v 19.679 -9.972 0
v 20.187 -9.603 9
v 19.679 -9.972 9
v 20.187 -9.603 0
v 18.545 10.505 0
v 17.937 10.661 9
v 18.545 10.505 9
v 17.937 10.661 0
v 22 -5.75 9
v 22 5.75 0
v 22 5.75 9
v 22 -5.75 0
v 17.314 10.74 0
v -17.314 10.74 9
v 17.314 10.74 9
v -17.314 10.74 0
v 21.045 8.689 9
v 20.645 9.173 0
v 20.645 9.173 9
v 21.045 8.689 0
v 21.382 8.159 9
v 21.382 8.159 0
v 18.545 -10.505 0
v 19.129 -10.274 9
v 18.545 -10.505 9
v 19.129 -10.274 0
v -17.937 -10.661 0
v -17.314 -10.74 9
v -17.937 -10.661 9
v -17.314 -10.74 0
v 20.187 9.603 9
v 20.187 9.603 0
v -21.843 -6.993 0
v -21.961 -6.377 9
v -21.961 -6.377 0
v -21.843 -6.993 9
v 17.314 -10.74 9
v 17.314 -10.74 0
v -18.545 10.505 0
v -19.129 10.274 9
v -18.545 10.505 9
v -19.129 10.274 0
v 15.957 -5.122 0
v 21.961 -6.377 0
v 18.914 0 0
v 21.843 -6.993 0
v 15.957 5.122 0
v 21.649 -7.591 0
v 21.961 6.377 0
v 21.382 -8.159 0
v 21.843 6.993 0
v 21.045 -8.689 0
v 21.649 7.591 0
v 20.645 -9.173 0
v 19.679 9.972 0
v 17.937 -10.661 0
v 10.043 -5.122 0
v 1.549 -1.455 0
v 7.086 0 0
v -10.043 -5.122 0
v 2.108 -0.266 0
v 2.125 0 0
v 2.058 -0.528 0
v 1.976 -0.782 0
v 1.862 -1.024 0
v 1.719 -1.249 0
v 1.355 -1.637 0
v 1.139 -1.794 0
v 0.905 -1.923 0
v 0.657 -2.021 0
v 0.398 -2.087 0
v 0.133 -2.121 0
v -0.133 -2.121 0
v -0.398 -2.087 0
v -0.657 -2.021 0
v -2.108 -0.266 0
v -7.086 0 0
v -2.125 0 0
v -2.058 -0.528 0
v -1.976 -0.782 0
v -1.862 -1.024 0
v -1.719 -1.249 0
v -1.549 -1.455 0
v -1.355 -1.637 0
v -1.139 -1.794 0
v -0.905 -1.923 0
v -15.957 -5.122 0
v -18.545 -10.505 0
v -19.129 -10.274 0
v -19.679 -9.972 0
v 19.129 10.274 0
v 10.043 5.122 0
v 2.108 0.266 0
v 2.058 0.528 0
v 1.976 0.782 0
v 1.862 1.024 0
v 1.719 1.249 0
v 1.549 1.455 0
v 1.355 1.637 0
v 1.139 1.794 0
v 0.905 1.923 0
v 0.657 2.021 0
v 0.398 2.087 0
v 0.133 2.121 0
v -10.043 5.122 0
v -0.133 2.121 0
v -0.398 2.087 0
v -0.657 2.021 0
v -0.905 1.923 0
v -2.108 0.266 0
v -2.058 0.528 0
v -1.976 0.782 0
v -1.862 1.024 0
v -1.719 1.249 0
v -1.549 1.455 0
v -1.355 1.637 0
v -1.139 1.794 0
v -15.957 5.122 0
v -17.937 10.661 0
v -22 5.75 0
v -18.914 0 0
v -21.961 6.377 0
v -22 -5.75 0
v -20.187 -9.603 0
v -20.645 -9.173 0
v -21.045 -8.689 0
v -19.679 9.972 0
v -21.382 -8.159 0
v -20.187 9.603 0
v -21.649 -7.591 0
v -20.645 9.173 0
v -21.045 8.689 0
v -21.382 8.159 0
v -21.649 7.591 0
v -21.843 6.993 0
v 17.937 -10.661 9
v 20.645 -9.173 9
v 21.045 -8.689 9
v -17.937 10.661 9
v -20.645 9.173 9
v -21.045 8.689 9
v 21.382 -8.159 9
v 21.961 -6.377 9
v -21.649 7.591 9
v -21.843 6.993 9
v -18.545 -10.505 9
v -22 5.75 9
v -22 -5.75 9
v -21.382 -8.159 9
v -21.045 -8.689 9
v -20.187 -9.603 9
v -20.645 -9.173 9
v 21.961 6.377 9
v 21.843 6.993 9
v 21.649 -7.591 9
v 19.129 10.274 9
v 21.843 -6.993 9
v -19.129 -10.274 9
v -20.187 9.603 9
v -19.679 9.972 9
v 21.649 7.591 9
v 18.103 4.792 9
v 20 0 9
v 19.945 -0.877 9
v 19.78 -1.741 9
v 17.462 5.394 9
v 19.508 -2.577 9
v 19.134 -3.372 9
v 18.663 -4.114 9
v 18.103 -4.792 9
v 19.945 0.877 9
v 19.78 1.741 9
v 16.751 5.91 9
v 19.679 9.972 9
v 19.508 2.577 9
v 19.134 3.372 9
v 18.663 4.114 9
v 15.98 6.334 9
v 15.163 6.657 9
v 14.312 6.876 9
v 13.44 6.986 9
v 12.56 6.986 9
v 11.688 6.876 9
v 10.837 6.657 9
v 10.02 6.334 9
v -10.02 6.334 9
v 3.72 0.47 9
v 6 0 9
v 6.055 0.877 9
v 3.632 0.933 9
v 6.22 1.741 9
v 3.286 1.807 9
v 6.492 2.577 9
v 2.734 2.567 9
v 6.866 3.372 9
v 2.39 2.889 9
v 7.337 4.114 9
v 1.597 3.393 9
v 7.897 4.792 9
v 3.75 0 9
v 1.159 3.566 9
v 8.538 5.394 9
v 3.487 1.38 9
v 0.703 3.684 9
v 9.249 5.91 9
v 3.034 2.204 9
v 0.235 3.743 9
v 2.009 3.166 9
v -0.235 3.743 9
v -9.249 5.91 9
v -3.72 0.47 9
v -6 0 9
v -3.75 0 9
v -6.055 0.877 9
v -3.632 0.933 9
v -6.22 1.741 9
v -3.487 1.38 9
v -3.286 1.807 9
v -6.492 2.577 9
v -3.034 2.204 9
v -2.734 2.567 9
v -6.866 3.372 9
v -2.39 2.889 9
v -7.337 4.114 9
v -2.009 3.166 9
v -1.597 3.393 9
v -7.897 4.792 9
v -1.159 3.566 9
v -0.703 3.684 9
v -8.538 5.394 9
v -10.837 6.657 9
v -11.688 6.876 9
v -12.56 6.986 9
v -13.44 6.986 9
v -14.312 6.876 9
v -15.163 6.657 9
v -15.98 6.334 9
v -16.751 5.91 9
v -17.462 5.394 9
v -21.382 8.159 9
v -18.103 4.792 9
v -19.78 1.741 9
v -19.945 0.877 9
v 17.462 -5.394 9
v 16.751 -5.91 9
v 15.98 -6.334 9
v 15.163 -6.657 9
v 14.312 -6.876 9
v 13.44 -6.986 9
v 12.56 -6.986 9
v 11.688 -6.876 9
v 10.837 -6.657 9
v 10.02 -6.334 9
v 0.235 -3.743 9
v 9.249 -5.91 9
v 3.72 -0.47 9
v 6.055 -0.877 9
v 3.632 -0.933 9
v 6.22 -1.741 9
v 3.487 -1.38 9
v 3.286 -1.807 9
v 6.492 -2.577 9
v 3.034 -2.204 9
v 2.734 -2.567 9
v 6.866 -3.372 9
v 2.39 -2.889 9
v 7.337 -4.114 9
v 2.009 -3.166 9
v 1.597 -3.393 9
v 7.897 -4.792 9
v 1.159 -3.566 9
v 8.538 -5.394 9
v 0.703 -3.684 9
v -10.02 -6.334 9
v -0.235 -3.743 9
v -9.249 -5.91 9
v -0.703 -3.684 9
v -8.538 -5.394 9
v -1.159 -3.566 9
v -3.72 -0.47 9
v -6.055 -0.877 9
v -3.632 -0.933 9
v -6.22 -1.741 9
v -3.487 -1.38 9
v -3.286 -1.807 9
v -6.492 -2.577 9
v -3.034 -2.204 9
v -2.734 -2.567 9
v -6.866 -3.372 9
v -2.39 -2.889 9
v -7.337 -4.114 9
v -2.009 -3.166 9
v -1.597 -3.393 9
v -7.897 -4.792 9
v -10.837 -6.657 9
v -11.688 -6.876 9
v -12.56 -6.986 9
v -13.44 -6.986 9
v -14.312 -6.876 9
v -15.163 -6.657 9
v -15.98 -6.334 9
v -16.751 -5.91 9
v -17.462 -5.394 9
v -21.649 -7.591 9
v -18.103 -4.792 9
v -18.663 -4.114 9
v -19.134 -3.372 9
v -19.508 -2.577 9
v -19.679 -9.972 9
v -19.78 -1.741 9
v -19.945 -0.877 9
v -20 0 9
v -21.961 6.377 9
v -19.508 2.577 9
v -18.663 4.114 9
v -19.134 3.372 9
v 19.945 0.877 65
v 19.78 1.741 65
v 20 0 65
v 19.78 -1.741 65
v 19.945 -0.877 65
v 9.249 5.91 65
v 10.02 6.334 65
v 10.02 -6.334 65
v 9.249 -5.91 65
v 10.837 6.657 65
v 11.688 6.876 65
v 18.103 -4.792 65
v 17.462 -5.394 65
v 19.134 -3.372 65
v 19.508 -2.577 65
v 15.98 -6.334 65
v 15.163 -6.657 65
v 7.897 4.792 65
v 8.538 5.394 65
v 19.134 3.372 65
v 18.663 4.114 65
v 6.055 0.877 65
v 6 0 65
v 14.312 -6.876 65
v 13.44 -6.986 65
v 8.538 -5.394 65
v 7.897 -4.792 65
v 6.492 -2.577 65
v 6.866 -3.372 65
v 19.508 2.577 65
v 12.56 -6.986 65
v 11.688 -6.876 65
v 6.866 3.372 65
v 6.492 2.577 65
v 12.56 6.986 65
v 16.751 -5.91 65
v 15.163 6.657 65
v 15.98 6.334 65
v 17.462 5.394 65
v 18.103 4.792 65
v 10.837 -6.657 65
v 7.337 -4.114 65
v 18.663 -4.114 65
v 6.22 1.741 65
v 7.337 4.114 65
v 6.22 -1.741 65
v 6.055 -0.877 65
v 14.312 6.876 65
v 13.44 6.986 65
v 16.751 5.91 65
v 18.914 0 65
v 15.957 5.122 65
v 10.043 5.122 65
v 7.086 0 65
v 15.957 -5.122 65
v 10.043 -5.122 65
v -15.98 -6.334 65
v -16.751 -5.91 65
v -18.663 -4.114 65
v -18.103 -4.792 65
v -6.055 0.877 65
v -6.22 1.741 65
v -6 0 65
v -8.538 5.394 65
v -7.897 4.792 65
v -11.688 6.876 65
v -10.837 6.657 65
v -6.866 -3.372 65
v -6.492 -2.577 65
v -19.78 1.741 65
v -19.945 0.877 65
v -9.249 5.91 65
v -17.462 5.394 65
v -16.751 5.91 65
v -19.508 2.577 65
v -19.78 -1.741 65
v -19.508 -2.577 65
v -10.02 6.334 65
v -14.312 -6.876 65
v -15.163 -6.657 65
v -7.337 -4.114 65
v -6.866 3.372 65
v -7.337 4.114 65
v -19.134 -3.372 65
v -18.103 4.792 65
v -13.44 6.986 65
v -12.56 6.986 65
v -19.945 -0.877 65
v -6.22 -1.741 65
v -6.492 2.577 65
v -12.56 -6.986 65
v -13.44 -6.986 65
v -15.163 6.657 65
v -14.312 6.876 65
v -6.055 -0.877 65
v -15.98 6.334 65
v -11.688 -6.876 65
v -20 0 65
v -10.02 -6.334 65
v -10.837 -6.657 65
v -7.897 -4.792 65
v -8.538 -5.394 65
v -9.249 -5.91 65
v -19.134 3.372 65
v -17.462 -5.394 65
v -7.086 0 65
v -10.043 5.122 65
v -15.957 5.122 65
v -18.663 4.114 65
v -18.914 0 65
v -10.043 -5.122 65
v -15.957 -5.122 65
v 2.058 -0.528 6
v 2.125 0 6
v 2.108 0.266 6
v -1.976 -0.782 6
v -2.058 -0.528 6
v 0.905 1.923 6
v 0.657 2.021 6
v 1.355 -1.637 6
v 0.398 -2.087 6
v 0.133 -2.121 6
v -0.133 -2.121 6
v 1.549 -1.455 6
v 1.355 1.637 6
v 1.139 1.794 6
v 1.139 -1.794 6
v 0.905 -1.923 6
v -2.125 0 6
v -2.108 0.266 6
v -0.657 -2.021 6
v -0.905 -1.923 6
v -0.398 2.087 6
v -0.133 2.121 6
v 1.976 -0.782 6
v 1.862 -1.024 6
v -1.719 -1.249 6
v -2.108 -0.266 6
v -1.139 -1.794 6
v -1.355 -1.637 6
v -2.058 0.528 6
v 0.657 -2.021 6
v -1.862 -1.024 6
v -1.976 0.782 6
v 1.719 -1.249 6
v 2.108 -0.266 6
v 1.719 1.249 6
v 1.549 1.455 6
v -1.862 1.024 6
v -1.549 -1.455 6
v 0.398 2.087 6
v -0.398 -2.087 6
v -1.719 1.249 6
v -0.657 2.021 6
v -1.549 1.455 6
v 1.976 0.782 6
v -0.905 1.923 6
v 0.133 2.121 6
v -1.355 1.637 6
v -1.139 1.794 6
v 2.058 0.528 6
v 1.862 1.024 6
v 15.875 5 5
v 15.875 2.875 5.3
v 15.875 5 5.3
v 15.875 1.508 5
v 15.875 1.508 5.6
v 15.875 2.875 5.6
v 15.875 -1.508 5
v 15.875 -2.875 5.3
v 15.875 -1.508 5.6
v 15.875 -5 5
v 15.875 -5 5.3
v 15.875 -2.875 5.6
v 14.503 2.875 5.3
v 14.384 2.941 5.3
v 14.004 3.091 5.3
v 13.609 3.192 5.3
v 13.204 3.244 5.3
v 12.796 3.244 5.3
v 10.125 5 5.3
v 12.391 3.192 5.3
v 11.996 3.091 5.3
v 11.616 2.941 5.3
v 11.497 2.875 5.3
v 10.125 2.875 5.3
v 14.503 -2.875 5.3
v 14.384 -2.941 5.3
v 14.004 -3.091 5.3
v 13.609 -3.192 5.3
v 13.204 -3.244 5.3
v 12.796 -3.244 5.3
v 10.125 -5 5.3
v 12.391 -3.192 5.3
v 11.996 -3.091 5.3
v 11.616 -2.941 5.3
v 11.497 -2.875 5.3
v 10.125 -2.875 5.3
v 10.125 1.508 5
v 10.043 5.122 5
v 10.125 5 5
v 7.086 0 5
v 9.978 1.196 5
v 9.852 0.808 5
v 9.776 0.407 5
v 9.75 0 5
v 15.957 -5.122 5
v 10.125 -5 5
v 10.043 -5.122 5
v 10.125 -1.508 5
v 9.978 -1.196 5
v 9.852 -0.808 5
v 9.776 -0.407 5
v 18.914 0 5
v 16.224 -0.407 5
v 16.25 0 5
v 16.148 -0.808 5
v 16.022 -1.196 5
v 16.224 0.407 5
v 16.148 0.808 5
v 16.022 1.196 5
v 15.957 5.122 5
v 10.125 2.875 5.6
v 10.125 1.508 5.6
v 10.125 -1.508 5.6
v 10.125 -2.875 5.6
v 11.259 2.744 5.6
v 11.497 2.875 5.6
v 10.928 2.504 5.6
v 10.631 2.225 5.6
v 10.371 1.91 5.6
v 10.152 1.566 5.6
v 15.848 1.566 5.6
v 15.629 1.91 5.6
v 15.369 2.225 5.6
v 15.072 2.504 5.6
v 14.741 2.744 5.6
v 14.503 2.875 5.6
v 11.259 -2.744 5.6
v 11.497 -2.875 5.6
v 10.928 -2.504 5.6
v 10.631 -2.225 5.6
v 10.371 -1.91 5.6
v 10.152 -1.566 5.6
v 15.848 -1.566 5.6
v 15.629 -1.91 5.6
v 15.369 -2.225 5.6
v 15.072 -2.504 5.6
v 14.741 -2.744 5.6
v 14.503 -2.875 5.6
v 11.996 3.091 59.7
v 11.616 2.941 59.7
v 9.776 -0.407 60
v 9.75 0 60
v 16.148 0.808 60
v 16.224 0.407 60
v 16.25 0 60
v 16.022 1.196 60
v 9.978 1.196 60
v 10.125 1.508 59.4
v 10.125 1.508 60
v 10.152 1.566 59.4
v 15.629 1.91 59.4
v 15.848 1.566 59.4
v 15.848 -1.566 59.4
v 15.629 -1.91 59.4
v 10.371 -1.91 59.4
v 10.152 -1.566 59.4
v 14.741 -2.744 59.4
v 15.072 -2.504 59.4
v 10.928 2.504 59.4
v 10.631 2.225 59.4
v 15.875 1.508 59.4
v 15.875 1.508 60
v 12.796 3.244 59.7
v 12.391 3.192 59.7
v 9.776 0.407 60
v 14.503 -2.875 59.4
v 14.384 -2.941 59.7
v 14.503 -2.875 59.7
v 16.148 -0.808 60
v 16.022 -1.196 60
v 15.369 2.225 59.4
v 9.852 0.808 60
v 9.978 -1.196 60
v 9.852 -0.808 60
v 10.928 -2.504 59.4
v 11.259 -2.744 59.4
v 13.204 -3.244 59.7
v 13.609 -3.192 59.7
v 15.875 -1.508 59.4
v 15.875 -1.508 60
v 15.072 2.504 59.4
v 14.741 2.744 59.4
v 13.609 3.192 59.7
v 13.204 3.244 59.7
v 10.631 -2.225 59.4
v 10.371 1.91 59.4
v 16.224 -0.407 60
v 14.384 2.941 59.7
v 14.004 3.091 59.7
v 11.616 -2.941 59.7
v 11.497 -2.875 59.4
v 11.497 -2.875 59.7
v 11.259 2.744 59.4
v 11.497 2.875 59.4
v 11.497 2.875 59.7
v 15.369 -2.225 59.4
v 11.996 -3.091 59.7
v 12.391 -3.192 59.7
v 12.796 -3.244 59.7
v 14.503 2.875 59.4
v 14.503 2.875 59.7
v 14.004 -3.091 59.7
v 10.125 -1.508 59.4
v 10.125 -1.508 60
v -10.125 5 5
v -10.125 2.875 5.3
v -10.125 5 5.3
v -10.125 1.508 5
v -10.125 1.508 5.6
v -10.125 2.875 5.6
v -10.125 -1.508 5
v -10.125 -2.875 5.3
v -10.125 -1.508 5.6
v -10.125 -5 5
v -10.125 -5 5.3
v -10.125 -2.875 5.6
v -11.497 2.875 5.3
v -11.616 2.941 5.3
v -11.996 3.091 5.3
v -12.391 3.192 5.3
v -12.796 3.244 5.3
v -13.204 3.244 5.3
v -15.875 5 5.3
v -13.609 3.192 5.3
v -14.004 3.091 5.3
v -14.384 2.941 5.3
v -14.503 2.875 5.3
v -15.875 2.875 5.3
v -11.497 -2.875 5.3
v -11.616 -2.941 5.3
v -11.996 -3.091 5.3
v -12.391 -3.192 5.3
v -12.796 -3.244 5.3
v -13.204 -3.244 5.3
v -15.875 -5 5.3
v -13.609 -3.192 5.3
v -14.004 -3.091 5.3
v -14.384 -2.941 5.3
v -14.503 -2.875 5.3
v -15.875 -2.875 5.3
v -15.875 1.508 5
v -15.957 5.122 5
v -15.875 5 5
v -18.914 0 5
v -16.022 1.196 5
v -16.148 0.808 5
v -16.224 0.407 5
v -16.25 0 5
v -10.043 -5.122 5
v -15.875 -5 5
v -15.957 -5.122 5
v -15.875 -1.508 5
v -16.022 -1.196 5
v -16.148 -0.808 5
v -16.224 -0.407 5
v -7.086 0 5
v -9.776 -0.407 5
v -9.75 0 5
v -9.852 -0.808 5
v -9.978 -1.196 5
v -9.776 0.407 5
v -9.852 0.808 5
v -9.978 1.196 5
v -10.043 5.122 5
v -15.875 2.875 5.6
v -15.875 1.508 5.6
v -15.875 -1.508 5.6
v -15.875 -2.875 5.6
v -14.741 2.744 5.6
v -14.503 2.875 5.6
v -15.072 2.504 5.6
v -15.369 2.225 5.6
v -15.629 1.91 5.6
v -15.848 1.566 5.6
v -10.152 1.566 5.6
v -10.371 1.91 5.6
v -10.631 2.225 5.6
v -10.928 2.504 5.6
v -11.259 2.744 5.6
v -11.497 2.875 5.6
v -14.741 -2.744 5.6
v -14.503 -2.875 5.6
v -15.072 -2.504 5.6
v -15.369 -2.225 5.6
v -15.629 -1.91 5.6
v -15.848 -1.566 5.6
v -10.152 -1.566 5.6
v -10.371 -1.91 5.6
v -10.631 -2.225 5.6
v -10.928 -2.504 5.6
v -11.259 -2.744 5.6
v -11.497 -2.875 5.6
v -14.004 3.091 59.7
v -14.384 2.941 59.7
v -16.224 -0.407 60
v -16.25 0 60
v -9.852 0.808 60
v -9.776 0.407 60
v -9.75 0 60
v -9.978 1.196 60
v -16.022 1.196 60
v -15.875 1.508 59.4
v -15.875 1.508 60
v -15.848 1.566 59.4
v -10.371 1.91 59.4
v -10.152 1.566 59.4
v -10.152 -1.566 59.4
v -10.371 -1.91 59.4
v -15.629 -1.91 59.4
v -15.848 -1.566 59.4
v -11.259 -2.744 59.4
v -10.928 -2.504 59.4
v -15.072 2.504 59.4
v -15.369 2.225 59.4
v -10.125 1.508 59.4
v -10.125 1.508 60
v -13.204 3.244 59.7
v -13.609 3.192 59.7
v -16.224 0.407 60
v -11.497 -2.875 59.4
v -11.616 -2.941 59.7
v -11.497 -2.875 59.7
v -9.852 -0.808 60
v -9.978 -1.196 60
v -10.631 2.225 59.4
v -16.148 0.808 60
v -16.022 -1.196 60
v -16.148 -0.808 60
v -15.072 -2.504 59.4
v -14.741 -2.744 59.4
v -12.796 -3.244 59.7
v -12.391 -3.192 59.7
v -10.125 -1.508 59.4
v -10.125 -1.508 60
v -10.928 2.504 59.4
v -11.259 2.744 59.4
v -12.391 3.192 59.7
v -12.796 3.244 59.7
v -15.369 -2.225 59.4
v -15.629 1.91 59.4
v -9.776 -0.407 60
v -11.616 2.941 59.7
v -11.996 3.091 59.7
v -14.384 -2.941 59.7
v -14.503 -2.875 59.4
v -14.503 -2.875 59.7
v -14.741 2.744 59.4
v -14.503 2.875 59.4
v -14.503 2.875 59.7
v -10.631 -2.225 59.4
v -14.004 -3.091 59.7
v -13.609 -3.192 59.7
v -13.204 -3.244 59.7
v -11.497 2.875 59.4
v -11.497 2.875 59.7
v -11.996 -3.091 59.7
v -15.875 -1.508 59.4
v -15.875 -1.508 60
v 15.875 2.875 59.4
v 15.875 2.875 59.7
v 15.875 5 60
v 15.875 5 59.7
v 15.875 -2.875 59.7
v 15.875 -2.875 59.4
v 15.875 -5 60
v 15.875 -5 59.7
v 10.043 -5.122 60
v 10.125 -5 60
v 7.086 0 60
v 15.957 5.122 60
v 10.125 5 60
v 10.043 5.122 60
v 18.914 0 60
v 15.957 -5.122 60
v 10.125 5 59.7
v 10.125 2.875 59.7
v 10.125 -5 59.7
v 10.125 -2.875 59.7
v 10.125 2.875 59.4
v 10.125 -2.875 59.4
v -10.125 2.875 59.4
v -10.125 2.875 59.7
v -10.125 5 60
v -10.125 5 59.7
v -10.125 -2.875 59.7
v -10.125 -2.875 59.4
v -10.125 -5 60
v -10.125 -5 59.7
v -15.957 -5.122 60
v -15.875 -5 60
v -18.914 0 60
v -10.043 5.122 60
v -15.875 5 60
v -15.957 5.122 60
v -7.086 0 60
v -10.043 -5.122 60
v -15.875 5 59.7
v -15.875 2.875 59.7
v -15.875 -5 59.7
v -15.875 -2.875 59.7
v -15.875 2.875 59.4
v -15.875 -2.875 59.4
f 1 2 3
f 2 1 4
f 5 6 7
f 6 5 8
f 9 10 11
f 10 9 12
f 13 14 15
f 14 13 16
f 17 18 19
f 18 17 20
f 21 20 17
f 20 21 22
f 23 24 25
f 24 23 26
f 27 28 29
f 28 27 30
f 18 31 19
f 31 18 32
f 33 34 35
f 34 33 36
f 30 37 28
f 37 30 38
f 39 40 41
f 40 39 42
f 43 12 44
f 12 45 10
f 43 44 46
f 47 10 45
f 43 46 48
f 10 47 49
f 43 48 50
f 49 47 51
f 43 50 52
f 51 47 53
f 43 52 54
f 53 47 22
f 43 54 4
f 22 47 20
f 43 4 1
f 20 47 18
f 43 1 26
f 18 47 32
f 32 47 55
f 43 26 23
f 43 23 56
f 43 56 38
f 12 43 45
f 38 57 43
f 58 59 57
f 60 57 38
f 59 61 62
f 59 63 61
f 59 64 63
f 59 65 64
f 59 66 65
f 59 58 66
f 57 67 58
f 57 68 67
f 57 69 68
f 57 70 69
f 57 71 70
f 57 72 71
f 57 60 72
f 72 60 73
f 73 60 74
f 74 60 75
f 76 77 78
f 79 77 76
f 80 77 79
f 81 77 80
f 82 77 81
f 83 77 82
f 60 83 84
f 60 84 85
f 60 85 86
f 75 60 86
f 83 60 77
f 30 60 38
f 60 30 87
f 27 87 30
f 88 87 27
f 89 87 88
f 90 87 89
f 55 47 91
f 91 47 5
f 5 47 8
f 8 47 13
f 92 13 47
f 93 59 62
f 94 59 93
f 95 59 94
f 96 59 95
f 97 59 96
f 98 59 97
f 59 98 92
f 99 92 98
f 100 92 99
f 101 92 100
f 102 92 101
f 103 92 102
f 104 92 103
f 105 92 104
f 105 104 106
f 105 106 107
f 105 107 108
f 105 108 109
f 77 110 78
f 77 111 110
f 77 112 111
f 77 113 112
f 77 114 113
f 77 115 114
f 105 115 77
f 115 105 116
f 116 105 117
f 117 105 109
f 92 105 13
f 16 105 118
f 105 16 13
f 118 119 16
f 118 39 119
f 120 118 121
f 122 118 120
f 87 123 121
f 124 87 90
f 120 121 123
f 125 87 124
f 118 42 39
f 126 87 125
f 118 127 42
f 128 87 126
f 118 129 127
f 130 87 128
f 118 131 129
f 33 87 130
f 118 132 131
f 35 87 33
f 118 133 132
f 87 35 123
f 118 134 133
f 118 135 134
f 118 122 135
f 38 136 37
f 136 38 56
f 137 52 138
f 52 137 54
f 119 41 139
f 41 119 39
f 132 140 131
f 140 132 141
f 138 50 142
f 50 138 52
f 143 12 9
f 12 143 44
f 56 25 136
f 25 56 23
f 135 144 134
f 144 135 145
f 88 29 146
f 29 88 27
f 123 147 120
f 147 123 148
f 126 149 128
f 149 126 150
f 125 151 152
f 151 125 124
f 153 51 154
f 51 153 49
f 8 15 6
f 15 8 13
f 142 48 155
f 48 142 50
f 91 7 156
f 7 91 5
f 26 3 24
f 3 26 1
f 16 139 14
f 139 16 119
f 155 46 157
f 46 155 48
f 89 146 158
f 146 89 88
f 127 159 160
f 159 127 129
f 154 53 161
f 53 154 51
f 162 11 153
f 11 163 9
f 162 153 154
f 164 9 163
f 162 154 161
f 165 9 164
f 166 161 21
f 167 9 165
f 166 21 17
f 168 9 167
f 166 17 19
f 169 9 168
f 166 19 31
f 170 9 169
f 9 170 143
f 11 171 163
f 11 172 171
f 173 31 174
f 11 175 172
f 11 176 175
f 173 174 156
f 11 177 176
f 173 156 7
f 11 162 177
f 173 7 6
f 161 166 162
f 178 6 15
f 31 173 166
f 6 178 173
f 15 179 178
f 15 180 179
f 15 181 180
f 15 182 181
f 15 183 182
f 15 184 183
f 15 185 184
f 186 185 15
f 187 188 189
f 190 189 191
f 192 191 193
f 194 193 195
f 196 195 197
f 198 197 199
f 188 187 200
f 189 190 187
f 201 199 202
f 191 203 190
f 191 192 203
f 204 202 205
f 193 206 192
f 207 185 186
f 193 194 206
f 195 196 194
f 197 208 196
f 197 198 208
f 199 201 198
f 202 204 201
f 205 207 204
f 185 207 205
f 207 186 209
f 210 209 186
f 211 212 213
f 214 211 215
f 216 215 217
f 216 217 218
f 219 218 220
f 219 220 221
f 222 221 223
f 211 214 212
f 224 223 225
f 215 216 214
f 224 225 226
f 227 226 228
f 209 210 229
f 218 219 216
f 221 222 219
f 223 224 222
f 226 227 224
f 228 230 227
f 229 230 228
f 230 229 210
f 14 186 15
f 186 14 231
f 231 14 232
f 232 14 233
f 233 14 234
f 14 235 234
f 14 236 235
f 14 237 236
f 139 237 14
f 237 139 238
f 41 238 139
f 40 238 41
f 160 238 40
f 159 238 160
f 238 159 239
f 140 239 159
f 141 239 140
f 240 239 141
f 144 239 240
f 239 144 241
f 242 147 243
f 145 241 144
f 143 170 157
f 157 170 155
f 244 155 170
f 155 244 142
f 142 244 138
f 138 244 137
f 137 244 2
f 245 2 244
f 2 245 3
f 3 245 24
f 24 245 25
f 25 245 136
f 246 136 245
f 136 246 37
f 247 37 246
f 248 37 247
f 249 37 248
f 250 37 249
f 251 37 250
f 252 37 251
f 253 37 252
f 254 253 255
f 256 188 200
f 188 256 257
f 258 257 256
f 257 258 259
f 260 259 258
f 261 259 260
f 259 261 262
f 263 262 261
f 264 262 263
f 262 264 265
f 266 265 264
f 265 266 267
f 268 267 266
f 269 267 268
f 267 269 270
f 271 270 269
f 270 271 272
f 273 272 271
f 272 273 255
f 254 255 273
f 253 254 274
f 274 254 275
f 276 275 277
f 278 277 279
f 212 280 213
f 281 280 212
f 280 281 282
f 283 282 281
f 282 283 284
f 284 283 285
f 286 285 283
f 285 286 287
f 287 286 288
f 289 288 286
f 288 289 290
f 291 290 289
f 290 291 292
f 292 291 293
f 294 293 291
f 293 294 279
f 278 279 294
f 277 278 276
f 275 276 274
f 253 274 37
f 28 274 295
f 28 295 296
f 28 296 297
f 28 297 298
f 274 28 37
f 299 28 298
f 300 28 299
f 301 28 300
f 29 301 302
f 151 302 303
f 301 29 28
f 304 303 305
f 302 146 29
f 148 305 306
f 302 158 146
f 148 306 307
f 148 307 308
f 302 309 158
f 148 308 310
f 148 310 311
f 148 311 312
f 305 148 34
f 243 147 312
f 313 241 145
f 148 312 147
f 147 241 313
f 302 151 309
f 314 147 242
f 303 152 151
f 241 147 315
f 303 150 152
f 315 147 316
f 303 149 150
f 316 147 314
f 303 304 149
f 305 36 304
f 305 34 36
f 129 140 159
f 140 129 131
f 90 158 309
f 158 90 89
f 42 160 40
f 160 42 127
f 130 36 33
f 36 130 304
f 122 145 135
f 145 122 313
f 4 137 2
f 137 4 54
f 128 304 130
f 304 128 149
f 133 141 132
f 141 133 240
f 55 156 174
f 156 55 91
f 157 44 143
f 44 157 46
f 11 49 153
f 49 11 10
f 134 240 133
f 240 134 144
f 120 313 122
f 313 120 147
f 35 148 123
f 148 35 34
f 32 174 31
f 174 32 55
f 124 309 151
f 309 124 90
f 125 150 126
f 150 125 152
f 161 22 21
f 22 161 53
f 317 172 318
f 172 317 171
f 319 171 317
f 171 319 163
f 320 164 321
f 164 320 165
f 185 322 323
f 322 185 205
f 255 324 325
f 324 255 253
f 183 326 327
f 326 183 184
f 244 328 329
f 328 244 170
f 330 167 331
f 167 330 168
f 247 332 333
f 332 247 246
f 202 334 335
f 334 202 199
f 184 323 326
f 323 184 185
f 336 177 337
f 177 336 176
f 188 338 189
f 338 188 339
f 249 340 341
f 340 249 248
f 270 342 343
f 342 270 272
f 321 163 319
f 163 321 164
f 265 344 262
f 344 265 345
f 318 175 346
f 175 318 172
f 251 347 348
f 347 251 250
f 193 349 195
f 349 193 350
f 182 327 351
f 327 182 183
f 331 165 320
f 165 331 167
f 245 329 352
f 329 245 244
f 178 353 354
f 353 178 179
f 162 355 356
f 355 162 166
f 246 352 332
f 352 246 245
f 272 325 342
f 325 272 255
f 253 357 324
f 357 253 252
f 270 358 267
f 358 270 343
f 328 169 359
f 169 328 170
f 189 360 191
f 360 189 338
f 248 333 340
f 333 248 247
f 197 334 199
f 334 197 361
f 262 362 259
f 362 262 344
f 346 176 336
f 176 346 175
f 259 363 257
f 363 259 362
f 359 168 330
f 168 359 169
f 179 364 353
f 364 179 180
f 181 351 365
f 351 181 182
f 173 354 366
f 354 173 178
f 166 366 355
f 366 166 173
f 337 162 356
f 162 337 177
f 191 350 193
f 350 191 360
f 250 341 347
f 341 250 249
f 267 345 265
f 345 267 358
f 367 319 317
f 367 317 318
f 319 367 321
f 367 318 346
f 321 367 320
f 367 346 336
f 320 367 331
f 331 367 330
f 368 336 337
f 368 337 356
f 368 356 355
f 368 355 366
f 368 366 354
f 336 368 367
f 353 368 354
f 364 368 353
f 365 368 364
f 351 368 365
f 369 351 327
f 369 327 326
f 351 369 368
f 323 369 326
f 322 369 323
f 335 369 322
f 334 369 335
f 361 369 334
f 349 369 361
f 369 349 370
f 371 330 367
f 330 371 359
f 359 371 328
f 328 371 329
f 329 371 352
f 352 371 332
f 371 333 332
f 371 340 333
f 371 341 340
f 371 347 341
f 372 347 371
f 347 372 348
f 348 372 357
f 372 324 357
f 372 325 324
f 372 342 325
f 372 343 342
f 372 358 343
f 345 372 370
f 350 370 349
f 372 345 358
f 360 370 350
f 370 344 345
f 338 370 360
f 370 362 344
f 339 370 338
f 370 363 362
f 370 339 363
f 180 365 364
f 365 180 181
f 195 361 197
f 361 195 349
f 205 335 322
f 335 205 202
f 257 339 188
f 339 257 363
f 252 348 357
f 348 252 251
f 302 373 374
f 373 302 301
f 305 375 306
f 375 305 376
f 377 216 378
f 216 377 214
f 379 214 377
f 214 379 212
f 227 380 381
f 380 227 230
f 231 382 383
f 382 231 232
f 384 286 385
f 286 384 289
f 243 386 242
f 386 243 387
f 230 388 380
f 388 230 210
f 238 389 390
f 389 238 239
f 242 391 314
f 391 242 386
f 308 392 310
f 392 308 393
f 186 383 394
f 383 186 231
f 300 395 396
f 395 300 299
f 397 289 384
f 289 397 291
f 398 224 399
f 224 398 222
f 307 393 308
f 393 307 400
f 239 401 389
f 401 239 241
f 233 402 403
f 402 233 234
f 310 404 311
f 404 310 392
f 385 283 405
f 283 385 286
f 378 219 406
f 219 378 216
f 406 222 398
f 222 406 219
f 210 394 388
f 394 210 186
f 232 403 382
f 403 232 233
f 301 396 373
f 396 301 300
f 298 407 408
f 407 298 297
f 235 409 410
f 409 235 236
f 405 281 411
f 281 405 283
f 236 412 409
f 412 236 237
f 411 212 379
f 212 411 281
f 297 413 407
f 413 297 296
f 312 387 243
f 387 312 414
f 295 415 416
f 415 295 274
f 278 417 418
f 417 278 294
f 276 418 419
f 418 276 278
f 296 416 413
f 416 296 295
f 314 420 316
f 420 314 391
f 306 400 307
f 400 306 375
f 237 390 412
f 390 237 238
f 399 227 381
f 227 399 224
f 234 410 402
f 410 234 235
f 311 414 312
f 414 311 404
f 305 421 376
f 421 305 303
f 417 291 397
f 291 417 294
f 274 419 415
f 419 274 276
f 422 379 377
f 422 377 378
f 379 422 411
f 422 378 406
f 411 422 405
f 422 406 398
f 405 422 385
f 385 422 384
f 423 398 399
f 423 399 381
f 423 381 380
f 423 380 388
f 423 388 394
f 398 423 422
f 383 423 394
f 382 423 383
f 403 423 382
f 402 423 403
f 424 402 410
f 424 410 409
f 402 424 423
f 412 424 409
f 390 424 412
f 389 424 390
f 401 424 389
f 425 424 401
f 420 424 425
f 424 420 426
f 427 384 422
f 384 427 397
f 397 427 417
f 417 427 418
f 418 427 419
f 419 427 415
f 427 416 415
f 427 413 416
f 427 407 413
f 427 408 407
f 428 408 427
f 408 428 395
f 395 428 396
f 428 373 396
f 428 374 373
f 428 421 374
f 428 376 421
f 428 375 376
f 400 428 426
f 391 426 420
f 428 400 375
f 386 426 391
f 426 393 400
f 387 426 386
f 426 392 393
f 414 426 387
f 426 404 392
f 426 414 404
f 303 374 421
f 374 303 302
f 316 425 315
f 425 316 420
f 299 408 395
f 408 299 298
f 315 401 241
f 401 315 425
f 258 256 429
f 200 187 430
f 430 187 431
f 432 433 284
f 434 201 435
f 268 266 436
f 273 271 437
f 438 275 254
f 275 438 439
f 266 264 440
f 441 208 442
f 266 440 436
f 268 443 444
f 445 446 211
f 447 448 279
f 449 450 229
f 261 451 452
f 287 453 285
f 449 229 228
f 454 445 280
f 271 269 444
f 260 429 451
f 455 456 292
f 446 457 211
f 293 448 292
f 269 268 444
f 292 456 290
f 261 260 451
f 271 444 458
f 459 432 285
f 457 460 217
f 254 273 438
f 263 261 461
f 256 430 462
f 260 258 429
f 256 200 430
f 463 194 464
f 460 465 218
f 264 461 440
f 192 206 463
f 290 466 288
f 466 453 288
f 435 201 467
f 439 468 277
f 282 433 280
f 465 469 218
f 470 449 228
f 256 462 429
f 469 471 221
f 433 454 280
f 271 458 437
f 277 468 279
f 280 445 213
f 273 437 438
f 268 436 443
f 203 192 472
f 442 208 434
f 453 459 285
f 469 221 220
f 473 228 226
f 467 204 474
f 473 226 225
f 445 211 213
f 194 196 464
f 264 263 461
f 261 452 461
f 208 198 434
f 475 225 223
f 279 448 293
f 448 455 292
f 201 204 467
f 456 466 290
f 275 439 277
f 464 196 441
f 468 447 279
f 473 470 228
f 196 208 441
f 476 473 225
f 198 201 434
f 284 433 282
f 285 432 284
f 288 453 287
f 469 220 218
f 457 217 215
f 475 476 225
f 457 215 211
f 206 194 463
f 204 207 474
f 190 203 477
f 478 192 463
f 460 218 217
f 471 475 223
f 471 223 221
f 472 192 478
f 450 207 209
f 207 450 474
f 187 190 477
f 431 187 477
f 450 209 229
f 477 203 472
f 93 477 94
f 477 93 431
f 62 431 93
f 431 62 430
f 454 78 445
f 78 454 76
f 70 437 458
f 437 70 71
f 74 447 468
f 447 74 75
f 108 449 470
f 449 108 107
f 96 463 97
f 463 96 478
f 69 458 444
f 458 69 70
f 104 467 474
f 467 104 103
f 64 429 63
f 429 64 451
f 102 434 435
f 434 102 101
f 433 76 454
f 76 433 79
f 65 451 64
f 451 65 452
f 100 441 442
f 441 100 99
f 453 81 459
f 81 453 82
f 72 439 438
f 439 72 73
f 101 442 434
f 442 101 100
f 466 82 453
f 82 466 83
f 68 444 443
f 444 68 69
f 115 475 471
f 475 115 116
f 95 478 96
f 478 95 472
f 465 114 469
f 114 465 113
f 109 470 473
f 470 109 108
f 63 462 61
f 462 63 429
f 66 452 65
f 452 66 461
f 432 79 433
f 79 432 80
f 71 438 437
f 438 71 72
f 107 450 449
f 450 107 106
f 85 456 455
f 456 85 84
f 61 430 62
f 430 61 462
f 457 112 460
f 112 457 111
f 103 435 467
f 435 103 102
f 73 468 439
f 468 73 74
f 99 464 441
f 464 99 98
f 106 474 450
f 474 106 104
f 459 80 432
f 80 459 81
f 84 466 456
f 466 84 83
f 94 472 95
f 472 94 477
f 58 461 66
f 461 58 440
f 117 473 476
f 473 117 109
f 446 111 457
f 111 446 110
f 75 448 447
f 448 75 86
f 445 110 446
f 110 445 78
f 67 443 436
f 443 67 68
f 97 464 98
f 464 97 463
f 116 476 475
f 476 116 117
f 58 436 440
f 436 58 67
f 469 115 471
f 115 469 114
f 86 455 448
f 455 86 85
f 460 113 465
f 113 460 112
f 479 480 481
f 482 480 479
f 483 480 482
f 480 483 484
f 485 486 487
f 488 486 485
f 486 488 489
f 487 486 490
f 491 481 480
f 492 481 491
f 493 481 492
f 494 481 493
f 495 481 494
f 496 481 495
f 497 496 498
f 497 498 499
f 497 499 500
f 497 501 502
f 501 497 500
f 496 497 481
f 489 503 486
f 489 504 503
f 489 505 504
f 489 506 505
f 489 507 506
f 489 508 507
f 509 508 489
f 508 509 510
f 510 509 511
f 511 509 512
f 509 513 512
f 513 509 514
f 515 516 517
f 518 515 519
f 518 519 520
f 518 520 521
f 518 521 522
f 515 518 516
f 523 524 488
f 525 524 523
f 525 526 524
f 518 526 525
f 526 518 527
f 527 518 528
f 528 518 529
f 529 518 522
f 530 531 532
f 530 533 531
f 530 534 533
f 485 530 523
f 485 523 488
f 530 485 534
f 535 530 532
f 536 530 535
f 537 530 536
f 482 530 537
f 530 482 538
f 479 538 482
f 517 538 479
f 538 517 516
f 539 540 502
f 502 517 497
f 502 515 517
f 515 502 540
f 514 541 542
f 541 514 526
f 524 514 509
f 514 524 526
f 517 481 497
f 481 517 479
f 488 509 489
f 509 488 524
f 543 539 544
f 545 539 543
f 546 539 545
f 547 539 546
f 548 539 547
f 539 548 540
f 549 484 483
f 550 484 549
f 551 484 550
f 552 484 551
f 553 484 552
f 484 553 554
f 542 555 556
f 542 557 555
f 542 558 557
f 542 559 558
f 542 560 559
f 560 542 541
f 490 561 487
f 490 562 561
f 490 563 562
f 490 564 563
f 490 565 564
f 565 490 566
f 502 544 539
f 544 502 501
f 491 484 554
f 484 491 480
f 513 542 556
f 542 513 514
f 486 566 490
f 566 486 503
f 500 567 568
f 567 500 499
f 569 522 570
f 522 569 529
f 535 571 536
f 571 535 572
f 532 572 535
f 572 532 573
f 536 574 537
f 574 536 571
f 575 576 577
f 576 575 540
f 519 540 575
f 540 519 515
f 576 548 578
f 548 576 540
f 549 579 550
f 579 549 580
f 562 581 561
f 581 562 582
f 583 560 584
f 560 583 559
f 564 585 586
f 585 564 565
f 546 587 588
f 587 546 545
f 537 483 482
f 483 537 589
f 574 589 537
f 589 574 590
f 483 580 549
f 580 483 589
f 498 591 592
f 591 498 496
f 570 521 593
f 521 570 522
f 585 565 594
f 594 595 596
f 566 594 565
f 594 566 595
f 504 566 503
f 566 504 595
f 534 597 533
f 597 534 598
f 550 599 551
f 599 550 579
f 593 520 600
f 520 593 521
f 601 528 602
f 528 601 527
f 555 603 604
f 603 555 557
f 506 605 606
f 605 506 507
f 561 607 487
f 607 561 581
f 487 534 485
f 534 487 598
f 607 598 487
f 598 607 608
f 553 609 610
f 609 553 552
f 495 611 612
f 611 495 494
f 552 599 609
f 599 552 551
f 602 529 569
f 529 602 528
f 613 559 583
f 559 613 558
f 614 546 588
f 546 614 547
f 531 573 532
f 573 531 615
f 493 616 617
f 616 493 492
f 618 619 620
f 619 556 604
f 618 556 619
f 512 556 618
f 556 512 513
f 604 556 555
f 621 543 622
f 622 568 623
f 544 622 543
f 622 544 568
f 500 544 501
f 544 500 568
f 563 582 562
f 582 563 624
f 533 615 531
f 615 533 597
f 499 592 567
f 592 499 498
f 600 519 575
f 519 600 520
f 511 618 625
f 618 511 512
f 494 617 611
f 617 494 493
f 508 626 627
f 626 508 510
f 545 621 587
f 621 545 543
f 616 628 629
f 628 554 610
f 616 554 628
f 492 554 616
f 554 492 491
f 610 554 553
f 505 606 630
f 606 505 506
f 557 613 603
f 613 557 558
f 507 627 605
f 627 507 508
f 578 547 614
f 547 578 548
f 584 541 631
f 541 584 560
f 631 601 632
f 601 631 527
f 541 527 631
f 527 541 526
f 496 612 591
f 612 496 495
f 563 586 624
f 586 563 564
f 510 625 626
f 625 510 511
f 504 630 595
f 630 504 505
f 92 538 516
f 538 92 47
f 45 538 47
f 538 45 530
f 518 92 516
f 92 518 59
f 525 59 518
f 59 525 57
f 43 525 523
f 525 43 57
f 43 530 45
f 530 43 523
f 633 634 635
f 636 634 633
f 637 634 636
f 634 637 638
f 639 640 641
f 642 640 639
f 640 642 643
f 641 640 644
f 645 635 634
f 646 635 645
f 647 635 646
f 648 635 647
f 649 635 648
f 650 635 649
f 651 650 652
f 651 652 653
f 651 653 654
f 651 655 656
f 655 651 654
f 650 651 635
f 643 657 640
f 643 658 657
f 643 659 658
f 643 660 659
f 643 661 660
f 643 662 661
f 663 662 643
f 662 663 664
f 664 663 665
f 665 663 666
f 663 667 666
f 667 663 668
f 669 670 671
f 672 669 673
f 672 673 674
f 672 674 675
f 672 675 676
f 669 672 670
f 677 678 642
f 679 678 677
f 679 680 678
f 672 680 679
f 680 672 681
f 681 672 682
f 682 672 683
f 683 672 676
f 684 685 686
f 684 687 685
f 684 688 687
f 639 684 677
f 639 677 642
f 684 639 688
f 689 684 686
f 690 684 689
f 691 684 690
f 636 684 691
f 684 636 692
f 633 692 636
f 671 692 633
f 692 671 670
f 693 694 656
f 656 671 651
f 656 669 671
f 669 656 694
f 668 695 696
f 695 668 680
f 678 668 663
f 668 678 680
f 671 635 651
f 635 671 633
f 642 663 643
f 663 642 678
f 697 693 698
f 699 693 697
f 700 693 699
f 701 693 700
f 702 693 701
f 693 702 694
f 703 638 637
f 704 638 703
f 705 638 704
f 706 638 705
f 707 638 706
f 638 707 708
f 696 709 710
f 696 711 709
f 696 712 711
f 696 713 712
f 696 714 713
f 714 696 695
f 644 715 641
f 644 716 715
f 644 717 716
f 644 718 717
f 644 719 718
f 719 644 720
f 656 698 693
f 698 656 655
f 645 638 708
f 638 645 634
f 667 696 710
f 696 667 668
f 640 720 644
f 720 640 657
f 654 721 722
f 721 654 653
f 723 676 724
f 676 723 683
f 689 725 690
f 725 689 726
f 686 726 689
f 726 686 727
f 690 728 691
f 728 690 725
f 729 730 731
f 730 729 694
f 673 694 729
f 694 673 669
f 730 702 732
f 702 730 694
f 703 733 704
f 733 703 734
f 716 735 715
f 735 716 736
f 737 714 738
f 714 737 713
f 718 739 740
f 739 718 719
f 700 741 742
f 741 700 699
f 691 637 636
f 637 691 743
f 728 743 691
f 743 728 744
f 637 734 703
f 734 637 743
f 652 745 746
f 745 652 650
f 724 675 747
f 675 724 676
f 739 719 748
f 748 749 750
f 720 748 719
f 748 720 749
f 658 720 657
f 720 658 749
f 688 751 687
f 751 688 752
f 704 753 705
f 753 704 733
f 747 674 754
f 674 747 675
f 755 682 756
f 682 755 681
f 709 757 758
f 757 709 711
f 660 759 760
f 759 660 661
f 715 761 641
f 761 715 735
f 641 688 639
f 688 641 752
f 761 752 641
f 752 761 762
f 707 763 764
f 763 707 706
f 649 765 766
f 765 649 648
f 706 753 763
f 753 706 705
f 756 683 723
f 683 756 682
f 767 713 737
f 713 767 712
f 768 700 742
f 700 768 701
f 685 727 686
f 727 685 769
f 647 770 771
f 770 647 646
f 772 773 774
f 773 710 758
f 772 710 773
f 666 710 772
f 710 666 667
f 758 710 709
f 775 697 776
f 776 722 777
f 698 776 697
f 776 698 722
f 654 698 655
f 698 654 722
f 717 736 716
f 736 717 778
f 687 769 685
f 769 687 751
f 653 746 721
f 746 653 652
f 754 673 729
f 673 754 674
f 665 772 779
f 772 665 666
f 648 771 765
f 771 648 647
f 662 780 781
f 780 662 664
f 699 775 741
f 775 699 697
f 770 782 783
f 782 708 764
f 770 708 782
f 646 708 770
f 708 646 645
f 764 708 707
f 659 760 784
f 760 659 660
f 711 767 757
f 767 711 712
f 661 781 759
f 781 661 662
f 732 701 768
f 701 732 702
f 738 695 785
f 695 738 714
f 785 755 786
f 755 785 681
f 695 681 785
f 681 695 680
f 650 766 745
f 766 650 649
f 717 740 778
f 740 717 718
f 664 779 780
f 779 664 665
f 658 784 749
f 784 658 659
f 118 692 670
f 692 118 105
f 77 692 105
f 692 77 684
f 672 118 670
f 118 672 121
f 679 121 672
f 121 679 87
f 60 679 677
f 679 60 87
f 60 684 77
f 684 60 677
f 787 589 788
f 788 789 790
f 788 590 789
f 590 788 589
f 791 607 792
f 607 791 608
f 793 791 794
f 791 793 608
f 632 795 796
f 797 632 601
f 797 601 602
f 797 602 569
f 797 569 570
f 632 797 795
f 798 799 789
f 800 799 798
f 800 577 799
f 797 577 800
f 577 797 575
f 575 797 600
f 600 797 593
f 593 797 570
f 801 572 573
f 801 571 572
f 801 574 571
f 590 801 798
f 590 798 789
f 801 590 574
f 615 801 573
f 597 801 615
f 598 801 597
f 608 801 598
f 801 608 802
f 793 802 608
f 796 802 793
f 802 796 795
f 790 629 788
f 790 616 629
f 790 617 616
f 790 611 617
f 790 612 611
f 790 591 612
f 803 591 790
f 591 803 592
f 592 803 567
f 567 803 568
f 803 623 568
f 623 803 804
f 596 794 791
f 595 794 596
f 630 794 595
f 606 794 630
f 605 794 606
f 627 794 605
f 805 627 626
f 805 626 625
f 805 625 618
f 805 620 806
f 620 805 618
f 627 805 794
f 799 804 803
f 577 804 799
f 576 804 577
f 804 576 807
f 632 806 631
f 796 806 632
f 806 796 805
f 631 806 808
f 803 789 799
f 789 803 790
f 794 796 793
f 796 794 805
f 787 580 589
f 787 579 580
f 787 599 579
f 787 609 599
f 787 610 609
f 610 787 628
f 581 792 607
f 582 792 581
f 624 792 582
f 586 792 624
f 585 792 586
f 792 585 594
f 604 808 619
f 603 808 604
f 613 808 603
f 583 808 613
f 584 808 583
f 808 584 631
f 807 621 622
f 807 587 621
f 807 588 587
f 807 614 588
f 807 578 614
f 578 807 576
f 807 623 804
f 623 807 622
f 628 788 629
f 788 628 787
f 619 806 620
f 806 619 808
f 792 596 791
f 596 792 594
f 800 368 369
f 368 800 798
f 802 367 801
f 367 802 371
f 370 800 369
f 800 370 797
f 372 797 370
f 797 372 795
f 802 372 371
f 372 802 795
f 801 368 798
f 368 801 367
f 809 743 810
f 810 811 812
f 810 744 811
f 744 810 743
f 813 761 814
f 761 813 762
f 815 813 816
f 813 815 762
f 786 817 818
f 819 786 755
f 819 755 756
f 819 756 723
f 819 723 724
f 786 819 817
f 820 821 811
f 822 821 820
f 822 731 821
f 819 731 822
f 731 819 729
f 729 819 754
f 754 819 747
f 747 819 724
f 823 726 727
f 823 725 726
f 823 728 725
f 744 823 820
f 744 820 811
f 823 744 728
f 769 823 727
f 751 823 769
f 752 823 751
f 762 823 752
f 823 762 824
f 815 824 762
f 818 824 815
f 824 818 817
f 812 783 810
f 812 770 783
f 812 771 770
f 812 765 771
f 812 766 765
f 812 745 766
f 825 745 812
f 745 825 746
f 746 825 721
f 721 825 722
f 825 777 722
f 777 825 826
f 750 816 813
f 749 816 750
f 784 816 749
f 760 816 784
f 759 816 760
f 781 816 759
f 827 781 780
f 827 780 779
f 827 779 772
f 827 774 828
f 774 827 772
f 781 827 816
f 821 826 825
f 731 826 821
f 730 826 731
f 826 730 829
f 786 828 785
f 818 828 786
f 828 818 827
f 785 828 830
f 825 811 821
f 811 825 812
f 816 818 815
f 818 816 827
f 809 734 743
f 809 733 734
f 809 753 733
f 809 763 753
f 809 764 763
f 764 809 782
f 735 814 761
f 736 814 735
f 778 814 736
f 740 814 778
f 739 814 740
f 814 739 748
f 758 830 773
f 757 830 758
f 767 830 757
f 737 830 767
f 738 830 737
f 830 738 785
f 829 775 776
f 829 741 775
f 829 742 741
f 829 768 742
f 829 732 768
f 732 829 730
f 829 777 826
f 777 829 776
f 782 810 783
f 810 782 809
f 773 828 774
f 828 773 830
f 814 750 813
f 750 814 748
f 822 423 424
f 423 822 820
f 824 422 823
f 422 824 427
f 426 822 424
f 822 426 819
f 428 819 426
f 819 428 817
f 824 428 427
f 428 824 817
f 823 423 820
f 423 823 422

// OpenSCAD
$fn = 50;


difference() {
	union() {
		hull() {
			translate(v = [-17.0000000000, 5.7500000000, 0]) {
				cylinder(h = 9, r = 5);
			}
			translate(v = [17.0000000000, 5.7500000000, 0]) {
				cylinder(h = 9, r = 5);
			}
			translate(v = [-17.0000000000, -5.7500000000, 0]) {
				cylinder(h = 9, r = 5);
			}
			translate(v = [17.0000000000, -5.7500000000, 0]) {
				cylinder(h = 9, r = 5);
			}
		}
		translate(v = [13.0000000000, 0, 0.0000000000]) {
			cylinder(h = 65, r = 7.0000000000);
		}
		translate(v = [-13.0000000000, 0, 0.0000000000]) {
			cylinder(h = 65, r = 7.0000000000);
		}
		translate(v = [13.0000000000, 0, 59.0000000000]) {
			cylinder(h = 6, r = 7.0000000000);
		}
		translate(v = [-13.0000000000, 0, 59.0000000000]) {
			cylinder(h = 6, r = 7.0000000000);
		}
	}
	union() {
		translate(v = [0, 0, 9]) {
			rotate(a = [0, 0, 0]) {
				difference() {
					union() {
						#translate(v = [0, 0, -60.0000000000]) {
							cylinder(h = 60, r = 2.0000000000);
						}
						#translate(v = [0, 0, -3]) {
							cylinder(h = 3, r1 = 2.1250000000, r2 = 3.7500000000);
						}
						#translate(v = [0, 0, -60.0000000000]) {
							cylinder(h = 60, r = 2.1250000000);
						}
						#translate(v = [0, 0, -60.0000000000]) {
							cylinder(h = 60, r = 2.0000000000);
						}
					}
					union();
				}
			}
		}
		translate(v = [13.0000000000, 0, 0]) {
			rotate(a = [0, 0, 0]) {
				difference() {
					union() {
						#translate(v = [-2.8750000000, -5.0000000000, -0.3000000000]) {
							cube(size = [5.7500000000, 10, 0.3000000000]);
						}
						#translate(v = [-2.8750000000, -2.8750000000, -0.6000000000]) {
							cube(size = [5.7500000000, 5.7500000000, 0.3000000000]);
						}
						#translate(v = [-2.8750000000, -5.0000000000, 5]) {
							cube(size = [5.7500000000, 10, 0.3000000000]);
						}
						#translate(v = [-2.8750000000, -2.8750000000, 5.3000000000]) {
							cube(size = [5.7500000000, 5.7500000000, 0.3000000000]);
						}
						#translate(v = [0, 0, -100.0000000000]) {
							cylinder(h = 200, r = 3.2500000000);
						}
						#linear_extrude(height = 5) {
							polygon(points = [[5.9142500000, 0.0000000000], [2.9571250000, 5.1218907443], [-2.9571250000, 5.1218907443], [-5.9142500000, 0.0000000000], [-2.9571250000, -5.1218907443], [2.9571250000, -5.1218907443]]);
						}
						#translate(v = [-2.8750000000, -5.0000000000, -0.3000000000]) {
							cube(size = [5.7500000000, 10, 0.3000000000]);
						}
						#translate(v = [-2.8750000000, -2.8750000000, -0.6000000000]) {
							cube(size = [5.7500000000, 5.7500000000, 0.3000000000]);
						}
						#translate(v = [-2.8750000000, -5.0000000000, 5]) {
							cube(size = [5.7500000000, 10, 0.3000000000]);
						}
						#translate(v = [-2.8750000000, -2.8750000000, 5.3000000000]) {
							cube(size = [5.7500000000, 5.7500000000, 0.3000000000]);
						}
						#translate(v = [0, 0, -100.0000000000]) {
							cylinder(h = 200, r = 3.2500000000);
						}
						#translate(v = [-2.8750000000, -5.0000000000, -0.3000000000]) {
							cube(size = [5.7500000000, 10, 0.3000000000]);
						}
						#translate(v = [-2.8750000000, -2.8750000000, -0.6000000000]) {
							cube(size = [5.7500000000, 5.7500000000, 0.3000000000]);
						}
						#translate(v = [-2.8750000000, -5.0000000000, 5]) {
							cube(size = [5.7500000000, 10, 0.3000000000]);
						}
						#translate(v = [-2.8750000000, -2.8750000000, 5.3000000000]) {
							cube(size = [5.7500000000, 5.7500000000, 0.3000000000]);
						}
						#translate(v = [0, 0, -100.0000000000]) {
							cylinder(h = 200, r = 3.2500000000);
						}
					}
					union();
				}
			}
		}
		translate(v = [-13.0000000000, 0, 0]) {
			rotate(a = [0, 0, 0]) {
				difference() {
					union() {
						#translate(v = [-2.8750000000, -5.0000000000, -0.3000000000]) {
							cube(size = [5.7500000000, 10, 0.3000000000]);
						}
						#translate(v = [-2.8750000000, -2.8750000000, -0.6000000000]) {
							cube(size = [5.7500000000, 5.7500000000, 0.3000000000]);
						}
						#translate(v = [-2.8750000000, -5.0000000000, 5]) {
							cube(size = [5.7500000000, 10, 0.3000000000]);
						}
						#translate(v = [-2.8750000000, -2.8750000000, 5.3000000000]) {
							cube(size = [5.7500000000, 5.7500000000, 0.3000000000]);
						}
						#translate(v = [0, 0, -100.0000000000]) {
							cylinder(h = 200, r = 3.2500000000);
						}
						#linear_extrude(height = 5) {
							polygon(points = [[5.9142500000, 0.0000000000], [2.9571250000, 5.1218907443], [-2.9571250000, 5.1218907443], [-5.9142500000, 0.0000000000], [-2.9571250000, -5.1218907443], [2.9571250000, -5.1218907443]]);
						}
						#translate(v = [-2.8750000000, -5.0000000000, -0.3000000000]) {
							cube(size = [5.7500000000, 10, 0.3000000000]);
						}
						#translate(v = [-2.8750000000, -2.8750000000, -0.6000000000]) {
							cube(size = [5.7500000000, 5.7500000000, 0.3000000000]);
						}
						#translate(v = [-2.8750000000, -5.0000000000, 5]) {
							cube(size = [5.7500000000, 10, 0.3000000000]);
						}
						#translate(v = [-2.8750000000, -2.8750000000, 5.3000000000]) {
							cube(size = [5.7500000000, 5.7500000000, 0.3000000000]);
						}
						#translate(v = [0, 0, -100.0000000000]) {
							cylinder(h = 200, r = 3.2500000000);
						}
						#translate(v = [-2.8750000000, -5.0000000000, -0.3000000000]) {
							cube(size = [5.7500000000, 10, 0.3000000000]);
						}
						#translate(v = [-2.8750000000, -2.8750000000, -0.6000000000]) {
							cube(size = [5.7500000000, 5.7500000000, 0.3000000000]);
						}
						#translate(v = [-2.8750000000, -5.0000000000, 5]) {
							cube(size = [5.7500000000, 10, 0.3000000000]);
						}
						#translate(v = [-2.8750000000, -2.8750000000, 5.3000000000]) {
							cube(size = [5.7500000000, 5.7500000000, 0.3000000000]);
						}
						#translate(v = [0, 0, -100.0000000000]) {
							cylinder(h = 200, r = 3.2500000000);
						}
					}
					union();
				}
			}
		}
		translate(v = [13.0000000000, 0, 65]) {
			rotate(a = [0, 0, 0]) {
				difference() {
					union() {
						#translate(v = [-2.8750000000, -5.0000000000, -5.3000000000]) {
							cube(size = [5.7500000000, 10, 0.3000000000]);
						}
						#translate(v = [-2.8750000000, -2.8750000000, -5.6000000000]) {
							cube(size = [5.7500000000, 5.7500000000, 0.3000000000]);
						}
						#translate(v = [-2.8750000000, -5.0000000000, 0]) {
							cube(size = [5.7500000000, 10, 0.3000000000]);
						}
						#translate(v = [-2.8750000000, -2.8750000000, 0.3000000000]) {
							cube(size = [5.7500000000, 5.7500000000, 0.3000000000]);
						}
						#translate(v = [0, 0, -100.0000000000]) {
							cylinder(h = 200, r = 3.2500000000);
						}
						translate(v = [0, 0, -5]) {
							#linear_extrude(height = 5) {
								polygon(points = [[5.9142500000, 0.0000000000], [2.9571250000, 5.1218907443], [-2.9571250000, 5.1218907443], [-5.9142500000, 0.0000000000], [-2.9571250000, -5.1218907443], [2.9571250000, -5.1218907443]]);
							}
						}
						#translate(v = [-2.8750000000, -5.0000000000, -5.3000000000]) {
							cube(size = [5.7500000000, 10, 0.3000000000]);
						}
						#translate(v = [-2.8750000000, -2.8750000000, -5.6000000000]) {
							cube(size = [5.7500000000, 5.7500000000, 0.3000000000]);
						}
						#translate(v = [-2.8750000000, -5.0000000000, 0]) {
							cube(size = [5.7500000000, 10, 0.3000000000]);
						}
						#translate(v = [-2.8750000000, -2.8750000000, 0.3000000000]) {
							cube(size = [5.7500000000, 5.7500000000, 0.3000000000]);
						}
						#translate(v = [0, 0, -100.0000000000]) {
							cylinder(h = 200, r = 3.2500000000);
						}
						#translate(v = [-2.8750000000, -5.0000000000, -5.3000000000]) {
							cube(size = [5.7500000000, 10, 0.3000000000]);
						}
						#translate(v = [-2.8750000000, -2.8750000000, -5.6000000000]) {
							cube(size = [5.7500000000, 5.7500000000, 0.3000000000]);
						}
						#translate(v = [-2.8750000000, -5.0000000000, 0]) {
							cube(size = [5.7500000000, 10, 0.3000000000]);
						}
						#translate(v = [-2.8750000000, -2.8750000000, 0.3000000000]) {
							cube(size = [5.7500000000, 5.7500000000, 0.3000000000]);
						}
						#translate(v = [0, 0, -100.0000000000]) {
							cylinder(h = 200, r = 3.2500000000);
						}
					}
					union();
				}
			}
		}
		translate(v = [-13.0000000000, 0, 65]) {
			rotate(a = [0, 0, 0]) {
				difference() {
					union() {
						#translate(v = [-2.8750000000, -5.0000000000, -5.3000000000]) {
							cube(size = [5.7500000000, 10, 0.3000000000]);
						}
						#translate(v = [-2.8750000000, -2.8750000000, -5.6000000000]) {
							cube(size = [5.7500000000, 5.7500000000, 0.3000000000]);
						}
						#translate(v = [-2.8750000000, -5.0000000000, 0]) {
							cube(size = [5.7500000000, 10, 0.3000000000]);
						}
						#translate(v = [-2.8750000000, -2.8750000000, 0.3000000000]) {
							cube(size = [5.7500000000, 5.7500000000, 0.3000000000]);
						}
						#translate(v = [0, 0, -100.0000000000]) {
							cylinder(h = 200, r = 3.2500000000);
						}
						translate(v = [0, 0, -5]) {
							#linear_extrude(height = 5) {
								polygon(points = [[5.9142500000, 0.0000000000], [2.9571250000, 5.1218907443], [-2.9571250000, 5.1218907443], [-5.9142500000, 0.0000000000], [-2.9571250000, -5.1218907443], [2.9571250000, -5.1218907443]]);
							}
						}
						#translate(v = [-2.8750000000, -5.0000000000, -5.3000000000]) {
							cube(size = [5.7500000000, 10, 0.3000000000]);
						}
						#translate(v = [-2.8750000000, -2.8750000000, -5.6000000000]) {
							cube(size = [5.7500000000, 5.7500000000, 0.3000000000]);
						}
						#translate(v = [-2.8750000000, -5.0000000000, 0]) {
							cube(size = [5.7500000000, 10, 0.3000000000]);
						}
						#translate(v = [-2.8750000000, -2.8750000000, 0.3000000000]) {
							cube(size = [5.7500000000, 5.7500000000, 0.3000000000]);
						}
						#translate(v = [0, 0, -100.0000000000]) {
							cylinder(h = 200, r = 3.2500000000);
						}
						#translate(v = [-2.8750000000, -5.0000000000, -5.3000000000]) {
							cube(size = [5.7500000000, 10, 0.3000000000]);
						}
						#translate(v = [-2.8750000000, -2.8750000000, -5.6000000000]) {
							cube(size = [5.7500000000, 5.7500000000, 0.3000000000]);
						}
						#translate(v = [-2.8750000000, -5.0000000000, 0]) {
							cube(size = [5.7500000000, 10, 0.3000000000]);
						}
						#translate(v = [-2.8750000000, -2.8750000000, 0.3000000000]) {
							cube(size = [5.7500000000, 5.7500000000, 0.3000000000]);
						}
						#translate(v = [0, 0, -100.0000000000]) {
							cylinder(h = 200, r = 3.2500000000);
						}
					}
					union();
				}
			}
		}
	}
}
